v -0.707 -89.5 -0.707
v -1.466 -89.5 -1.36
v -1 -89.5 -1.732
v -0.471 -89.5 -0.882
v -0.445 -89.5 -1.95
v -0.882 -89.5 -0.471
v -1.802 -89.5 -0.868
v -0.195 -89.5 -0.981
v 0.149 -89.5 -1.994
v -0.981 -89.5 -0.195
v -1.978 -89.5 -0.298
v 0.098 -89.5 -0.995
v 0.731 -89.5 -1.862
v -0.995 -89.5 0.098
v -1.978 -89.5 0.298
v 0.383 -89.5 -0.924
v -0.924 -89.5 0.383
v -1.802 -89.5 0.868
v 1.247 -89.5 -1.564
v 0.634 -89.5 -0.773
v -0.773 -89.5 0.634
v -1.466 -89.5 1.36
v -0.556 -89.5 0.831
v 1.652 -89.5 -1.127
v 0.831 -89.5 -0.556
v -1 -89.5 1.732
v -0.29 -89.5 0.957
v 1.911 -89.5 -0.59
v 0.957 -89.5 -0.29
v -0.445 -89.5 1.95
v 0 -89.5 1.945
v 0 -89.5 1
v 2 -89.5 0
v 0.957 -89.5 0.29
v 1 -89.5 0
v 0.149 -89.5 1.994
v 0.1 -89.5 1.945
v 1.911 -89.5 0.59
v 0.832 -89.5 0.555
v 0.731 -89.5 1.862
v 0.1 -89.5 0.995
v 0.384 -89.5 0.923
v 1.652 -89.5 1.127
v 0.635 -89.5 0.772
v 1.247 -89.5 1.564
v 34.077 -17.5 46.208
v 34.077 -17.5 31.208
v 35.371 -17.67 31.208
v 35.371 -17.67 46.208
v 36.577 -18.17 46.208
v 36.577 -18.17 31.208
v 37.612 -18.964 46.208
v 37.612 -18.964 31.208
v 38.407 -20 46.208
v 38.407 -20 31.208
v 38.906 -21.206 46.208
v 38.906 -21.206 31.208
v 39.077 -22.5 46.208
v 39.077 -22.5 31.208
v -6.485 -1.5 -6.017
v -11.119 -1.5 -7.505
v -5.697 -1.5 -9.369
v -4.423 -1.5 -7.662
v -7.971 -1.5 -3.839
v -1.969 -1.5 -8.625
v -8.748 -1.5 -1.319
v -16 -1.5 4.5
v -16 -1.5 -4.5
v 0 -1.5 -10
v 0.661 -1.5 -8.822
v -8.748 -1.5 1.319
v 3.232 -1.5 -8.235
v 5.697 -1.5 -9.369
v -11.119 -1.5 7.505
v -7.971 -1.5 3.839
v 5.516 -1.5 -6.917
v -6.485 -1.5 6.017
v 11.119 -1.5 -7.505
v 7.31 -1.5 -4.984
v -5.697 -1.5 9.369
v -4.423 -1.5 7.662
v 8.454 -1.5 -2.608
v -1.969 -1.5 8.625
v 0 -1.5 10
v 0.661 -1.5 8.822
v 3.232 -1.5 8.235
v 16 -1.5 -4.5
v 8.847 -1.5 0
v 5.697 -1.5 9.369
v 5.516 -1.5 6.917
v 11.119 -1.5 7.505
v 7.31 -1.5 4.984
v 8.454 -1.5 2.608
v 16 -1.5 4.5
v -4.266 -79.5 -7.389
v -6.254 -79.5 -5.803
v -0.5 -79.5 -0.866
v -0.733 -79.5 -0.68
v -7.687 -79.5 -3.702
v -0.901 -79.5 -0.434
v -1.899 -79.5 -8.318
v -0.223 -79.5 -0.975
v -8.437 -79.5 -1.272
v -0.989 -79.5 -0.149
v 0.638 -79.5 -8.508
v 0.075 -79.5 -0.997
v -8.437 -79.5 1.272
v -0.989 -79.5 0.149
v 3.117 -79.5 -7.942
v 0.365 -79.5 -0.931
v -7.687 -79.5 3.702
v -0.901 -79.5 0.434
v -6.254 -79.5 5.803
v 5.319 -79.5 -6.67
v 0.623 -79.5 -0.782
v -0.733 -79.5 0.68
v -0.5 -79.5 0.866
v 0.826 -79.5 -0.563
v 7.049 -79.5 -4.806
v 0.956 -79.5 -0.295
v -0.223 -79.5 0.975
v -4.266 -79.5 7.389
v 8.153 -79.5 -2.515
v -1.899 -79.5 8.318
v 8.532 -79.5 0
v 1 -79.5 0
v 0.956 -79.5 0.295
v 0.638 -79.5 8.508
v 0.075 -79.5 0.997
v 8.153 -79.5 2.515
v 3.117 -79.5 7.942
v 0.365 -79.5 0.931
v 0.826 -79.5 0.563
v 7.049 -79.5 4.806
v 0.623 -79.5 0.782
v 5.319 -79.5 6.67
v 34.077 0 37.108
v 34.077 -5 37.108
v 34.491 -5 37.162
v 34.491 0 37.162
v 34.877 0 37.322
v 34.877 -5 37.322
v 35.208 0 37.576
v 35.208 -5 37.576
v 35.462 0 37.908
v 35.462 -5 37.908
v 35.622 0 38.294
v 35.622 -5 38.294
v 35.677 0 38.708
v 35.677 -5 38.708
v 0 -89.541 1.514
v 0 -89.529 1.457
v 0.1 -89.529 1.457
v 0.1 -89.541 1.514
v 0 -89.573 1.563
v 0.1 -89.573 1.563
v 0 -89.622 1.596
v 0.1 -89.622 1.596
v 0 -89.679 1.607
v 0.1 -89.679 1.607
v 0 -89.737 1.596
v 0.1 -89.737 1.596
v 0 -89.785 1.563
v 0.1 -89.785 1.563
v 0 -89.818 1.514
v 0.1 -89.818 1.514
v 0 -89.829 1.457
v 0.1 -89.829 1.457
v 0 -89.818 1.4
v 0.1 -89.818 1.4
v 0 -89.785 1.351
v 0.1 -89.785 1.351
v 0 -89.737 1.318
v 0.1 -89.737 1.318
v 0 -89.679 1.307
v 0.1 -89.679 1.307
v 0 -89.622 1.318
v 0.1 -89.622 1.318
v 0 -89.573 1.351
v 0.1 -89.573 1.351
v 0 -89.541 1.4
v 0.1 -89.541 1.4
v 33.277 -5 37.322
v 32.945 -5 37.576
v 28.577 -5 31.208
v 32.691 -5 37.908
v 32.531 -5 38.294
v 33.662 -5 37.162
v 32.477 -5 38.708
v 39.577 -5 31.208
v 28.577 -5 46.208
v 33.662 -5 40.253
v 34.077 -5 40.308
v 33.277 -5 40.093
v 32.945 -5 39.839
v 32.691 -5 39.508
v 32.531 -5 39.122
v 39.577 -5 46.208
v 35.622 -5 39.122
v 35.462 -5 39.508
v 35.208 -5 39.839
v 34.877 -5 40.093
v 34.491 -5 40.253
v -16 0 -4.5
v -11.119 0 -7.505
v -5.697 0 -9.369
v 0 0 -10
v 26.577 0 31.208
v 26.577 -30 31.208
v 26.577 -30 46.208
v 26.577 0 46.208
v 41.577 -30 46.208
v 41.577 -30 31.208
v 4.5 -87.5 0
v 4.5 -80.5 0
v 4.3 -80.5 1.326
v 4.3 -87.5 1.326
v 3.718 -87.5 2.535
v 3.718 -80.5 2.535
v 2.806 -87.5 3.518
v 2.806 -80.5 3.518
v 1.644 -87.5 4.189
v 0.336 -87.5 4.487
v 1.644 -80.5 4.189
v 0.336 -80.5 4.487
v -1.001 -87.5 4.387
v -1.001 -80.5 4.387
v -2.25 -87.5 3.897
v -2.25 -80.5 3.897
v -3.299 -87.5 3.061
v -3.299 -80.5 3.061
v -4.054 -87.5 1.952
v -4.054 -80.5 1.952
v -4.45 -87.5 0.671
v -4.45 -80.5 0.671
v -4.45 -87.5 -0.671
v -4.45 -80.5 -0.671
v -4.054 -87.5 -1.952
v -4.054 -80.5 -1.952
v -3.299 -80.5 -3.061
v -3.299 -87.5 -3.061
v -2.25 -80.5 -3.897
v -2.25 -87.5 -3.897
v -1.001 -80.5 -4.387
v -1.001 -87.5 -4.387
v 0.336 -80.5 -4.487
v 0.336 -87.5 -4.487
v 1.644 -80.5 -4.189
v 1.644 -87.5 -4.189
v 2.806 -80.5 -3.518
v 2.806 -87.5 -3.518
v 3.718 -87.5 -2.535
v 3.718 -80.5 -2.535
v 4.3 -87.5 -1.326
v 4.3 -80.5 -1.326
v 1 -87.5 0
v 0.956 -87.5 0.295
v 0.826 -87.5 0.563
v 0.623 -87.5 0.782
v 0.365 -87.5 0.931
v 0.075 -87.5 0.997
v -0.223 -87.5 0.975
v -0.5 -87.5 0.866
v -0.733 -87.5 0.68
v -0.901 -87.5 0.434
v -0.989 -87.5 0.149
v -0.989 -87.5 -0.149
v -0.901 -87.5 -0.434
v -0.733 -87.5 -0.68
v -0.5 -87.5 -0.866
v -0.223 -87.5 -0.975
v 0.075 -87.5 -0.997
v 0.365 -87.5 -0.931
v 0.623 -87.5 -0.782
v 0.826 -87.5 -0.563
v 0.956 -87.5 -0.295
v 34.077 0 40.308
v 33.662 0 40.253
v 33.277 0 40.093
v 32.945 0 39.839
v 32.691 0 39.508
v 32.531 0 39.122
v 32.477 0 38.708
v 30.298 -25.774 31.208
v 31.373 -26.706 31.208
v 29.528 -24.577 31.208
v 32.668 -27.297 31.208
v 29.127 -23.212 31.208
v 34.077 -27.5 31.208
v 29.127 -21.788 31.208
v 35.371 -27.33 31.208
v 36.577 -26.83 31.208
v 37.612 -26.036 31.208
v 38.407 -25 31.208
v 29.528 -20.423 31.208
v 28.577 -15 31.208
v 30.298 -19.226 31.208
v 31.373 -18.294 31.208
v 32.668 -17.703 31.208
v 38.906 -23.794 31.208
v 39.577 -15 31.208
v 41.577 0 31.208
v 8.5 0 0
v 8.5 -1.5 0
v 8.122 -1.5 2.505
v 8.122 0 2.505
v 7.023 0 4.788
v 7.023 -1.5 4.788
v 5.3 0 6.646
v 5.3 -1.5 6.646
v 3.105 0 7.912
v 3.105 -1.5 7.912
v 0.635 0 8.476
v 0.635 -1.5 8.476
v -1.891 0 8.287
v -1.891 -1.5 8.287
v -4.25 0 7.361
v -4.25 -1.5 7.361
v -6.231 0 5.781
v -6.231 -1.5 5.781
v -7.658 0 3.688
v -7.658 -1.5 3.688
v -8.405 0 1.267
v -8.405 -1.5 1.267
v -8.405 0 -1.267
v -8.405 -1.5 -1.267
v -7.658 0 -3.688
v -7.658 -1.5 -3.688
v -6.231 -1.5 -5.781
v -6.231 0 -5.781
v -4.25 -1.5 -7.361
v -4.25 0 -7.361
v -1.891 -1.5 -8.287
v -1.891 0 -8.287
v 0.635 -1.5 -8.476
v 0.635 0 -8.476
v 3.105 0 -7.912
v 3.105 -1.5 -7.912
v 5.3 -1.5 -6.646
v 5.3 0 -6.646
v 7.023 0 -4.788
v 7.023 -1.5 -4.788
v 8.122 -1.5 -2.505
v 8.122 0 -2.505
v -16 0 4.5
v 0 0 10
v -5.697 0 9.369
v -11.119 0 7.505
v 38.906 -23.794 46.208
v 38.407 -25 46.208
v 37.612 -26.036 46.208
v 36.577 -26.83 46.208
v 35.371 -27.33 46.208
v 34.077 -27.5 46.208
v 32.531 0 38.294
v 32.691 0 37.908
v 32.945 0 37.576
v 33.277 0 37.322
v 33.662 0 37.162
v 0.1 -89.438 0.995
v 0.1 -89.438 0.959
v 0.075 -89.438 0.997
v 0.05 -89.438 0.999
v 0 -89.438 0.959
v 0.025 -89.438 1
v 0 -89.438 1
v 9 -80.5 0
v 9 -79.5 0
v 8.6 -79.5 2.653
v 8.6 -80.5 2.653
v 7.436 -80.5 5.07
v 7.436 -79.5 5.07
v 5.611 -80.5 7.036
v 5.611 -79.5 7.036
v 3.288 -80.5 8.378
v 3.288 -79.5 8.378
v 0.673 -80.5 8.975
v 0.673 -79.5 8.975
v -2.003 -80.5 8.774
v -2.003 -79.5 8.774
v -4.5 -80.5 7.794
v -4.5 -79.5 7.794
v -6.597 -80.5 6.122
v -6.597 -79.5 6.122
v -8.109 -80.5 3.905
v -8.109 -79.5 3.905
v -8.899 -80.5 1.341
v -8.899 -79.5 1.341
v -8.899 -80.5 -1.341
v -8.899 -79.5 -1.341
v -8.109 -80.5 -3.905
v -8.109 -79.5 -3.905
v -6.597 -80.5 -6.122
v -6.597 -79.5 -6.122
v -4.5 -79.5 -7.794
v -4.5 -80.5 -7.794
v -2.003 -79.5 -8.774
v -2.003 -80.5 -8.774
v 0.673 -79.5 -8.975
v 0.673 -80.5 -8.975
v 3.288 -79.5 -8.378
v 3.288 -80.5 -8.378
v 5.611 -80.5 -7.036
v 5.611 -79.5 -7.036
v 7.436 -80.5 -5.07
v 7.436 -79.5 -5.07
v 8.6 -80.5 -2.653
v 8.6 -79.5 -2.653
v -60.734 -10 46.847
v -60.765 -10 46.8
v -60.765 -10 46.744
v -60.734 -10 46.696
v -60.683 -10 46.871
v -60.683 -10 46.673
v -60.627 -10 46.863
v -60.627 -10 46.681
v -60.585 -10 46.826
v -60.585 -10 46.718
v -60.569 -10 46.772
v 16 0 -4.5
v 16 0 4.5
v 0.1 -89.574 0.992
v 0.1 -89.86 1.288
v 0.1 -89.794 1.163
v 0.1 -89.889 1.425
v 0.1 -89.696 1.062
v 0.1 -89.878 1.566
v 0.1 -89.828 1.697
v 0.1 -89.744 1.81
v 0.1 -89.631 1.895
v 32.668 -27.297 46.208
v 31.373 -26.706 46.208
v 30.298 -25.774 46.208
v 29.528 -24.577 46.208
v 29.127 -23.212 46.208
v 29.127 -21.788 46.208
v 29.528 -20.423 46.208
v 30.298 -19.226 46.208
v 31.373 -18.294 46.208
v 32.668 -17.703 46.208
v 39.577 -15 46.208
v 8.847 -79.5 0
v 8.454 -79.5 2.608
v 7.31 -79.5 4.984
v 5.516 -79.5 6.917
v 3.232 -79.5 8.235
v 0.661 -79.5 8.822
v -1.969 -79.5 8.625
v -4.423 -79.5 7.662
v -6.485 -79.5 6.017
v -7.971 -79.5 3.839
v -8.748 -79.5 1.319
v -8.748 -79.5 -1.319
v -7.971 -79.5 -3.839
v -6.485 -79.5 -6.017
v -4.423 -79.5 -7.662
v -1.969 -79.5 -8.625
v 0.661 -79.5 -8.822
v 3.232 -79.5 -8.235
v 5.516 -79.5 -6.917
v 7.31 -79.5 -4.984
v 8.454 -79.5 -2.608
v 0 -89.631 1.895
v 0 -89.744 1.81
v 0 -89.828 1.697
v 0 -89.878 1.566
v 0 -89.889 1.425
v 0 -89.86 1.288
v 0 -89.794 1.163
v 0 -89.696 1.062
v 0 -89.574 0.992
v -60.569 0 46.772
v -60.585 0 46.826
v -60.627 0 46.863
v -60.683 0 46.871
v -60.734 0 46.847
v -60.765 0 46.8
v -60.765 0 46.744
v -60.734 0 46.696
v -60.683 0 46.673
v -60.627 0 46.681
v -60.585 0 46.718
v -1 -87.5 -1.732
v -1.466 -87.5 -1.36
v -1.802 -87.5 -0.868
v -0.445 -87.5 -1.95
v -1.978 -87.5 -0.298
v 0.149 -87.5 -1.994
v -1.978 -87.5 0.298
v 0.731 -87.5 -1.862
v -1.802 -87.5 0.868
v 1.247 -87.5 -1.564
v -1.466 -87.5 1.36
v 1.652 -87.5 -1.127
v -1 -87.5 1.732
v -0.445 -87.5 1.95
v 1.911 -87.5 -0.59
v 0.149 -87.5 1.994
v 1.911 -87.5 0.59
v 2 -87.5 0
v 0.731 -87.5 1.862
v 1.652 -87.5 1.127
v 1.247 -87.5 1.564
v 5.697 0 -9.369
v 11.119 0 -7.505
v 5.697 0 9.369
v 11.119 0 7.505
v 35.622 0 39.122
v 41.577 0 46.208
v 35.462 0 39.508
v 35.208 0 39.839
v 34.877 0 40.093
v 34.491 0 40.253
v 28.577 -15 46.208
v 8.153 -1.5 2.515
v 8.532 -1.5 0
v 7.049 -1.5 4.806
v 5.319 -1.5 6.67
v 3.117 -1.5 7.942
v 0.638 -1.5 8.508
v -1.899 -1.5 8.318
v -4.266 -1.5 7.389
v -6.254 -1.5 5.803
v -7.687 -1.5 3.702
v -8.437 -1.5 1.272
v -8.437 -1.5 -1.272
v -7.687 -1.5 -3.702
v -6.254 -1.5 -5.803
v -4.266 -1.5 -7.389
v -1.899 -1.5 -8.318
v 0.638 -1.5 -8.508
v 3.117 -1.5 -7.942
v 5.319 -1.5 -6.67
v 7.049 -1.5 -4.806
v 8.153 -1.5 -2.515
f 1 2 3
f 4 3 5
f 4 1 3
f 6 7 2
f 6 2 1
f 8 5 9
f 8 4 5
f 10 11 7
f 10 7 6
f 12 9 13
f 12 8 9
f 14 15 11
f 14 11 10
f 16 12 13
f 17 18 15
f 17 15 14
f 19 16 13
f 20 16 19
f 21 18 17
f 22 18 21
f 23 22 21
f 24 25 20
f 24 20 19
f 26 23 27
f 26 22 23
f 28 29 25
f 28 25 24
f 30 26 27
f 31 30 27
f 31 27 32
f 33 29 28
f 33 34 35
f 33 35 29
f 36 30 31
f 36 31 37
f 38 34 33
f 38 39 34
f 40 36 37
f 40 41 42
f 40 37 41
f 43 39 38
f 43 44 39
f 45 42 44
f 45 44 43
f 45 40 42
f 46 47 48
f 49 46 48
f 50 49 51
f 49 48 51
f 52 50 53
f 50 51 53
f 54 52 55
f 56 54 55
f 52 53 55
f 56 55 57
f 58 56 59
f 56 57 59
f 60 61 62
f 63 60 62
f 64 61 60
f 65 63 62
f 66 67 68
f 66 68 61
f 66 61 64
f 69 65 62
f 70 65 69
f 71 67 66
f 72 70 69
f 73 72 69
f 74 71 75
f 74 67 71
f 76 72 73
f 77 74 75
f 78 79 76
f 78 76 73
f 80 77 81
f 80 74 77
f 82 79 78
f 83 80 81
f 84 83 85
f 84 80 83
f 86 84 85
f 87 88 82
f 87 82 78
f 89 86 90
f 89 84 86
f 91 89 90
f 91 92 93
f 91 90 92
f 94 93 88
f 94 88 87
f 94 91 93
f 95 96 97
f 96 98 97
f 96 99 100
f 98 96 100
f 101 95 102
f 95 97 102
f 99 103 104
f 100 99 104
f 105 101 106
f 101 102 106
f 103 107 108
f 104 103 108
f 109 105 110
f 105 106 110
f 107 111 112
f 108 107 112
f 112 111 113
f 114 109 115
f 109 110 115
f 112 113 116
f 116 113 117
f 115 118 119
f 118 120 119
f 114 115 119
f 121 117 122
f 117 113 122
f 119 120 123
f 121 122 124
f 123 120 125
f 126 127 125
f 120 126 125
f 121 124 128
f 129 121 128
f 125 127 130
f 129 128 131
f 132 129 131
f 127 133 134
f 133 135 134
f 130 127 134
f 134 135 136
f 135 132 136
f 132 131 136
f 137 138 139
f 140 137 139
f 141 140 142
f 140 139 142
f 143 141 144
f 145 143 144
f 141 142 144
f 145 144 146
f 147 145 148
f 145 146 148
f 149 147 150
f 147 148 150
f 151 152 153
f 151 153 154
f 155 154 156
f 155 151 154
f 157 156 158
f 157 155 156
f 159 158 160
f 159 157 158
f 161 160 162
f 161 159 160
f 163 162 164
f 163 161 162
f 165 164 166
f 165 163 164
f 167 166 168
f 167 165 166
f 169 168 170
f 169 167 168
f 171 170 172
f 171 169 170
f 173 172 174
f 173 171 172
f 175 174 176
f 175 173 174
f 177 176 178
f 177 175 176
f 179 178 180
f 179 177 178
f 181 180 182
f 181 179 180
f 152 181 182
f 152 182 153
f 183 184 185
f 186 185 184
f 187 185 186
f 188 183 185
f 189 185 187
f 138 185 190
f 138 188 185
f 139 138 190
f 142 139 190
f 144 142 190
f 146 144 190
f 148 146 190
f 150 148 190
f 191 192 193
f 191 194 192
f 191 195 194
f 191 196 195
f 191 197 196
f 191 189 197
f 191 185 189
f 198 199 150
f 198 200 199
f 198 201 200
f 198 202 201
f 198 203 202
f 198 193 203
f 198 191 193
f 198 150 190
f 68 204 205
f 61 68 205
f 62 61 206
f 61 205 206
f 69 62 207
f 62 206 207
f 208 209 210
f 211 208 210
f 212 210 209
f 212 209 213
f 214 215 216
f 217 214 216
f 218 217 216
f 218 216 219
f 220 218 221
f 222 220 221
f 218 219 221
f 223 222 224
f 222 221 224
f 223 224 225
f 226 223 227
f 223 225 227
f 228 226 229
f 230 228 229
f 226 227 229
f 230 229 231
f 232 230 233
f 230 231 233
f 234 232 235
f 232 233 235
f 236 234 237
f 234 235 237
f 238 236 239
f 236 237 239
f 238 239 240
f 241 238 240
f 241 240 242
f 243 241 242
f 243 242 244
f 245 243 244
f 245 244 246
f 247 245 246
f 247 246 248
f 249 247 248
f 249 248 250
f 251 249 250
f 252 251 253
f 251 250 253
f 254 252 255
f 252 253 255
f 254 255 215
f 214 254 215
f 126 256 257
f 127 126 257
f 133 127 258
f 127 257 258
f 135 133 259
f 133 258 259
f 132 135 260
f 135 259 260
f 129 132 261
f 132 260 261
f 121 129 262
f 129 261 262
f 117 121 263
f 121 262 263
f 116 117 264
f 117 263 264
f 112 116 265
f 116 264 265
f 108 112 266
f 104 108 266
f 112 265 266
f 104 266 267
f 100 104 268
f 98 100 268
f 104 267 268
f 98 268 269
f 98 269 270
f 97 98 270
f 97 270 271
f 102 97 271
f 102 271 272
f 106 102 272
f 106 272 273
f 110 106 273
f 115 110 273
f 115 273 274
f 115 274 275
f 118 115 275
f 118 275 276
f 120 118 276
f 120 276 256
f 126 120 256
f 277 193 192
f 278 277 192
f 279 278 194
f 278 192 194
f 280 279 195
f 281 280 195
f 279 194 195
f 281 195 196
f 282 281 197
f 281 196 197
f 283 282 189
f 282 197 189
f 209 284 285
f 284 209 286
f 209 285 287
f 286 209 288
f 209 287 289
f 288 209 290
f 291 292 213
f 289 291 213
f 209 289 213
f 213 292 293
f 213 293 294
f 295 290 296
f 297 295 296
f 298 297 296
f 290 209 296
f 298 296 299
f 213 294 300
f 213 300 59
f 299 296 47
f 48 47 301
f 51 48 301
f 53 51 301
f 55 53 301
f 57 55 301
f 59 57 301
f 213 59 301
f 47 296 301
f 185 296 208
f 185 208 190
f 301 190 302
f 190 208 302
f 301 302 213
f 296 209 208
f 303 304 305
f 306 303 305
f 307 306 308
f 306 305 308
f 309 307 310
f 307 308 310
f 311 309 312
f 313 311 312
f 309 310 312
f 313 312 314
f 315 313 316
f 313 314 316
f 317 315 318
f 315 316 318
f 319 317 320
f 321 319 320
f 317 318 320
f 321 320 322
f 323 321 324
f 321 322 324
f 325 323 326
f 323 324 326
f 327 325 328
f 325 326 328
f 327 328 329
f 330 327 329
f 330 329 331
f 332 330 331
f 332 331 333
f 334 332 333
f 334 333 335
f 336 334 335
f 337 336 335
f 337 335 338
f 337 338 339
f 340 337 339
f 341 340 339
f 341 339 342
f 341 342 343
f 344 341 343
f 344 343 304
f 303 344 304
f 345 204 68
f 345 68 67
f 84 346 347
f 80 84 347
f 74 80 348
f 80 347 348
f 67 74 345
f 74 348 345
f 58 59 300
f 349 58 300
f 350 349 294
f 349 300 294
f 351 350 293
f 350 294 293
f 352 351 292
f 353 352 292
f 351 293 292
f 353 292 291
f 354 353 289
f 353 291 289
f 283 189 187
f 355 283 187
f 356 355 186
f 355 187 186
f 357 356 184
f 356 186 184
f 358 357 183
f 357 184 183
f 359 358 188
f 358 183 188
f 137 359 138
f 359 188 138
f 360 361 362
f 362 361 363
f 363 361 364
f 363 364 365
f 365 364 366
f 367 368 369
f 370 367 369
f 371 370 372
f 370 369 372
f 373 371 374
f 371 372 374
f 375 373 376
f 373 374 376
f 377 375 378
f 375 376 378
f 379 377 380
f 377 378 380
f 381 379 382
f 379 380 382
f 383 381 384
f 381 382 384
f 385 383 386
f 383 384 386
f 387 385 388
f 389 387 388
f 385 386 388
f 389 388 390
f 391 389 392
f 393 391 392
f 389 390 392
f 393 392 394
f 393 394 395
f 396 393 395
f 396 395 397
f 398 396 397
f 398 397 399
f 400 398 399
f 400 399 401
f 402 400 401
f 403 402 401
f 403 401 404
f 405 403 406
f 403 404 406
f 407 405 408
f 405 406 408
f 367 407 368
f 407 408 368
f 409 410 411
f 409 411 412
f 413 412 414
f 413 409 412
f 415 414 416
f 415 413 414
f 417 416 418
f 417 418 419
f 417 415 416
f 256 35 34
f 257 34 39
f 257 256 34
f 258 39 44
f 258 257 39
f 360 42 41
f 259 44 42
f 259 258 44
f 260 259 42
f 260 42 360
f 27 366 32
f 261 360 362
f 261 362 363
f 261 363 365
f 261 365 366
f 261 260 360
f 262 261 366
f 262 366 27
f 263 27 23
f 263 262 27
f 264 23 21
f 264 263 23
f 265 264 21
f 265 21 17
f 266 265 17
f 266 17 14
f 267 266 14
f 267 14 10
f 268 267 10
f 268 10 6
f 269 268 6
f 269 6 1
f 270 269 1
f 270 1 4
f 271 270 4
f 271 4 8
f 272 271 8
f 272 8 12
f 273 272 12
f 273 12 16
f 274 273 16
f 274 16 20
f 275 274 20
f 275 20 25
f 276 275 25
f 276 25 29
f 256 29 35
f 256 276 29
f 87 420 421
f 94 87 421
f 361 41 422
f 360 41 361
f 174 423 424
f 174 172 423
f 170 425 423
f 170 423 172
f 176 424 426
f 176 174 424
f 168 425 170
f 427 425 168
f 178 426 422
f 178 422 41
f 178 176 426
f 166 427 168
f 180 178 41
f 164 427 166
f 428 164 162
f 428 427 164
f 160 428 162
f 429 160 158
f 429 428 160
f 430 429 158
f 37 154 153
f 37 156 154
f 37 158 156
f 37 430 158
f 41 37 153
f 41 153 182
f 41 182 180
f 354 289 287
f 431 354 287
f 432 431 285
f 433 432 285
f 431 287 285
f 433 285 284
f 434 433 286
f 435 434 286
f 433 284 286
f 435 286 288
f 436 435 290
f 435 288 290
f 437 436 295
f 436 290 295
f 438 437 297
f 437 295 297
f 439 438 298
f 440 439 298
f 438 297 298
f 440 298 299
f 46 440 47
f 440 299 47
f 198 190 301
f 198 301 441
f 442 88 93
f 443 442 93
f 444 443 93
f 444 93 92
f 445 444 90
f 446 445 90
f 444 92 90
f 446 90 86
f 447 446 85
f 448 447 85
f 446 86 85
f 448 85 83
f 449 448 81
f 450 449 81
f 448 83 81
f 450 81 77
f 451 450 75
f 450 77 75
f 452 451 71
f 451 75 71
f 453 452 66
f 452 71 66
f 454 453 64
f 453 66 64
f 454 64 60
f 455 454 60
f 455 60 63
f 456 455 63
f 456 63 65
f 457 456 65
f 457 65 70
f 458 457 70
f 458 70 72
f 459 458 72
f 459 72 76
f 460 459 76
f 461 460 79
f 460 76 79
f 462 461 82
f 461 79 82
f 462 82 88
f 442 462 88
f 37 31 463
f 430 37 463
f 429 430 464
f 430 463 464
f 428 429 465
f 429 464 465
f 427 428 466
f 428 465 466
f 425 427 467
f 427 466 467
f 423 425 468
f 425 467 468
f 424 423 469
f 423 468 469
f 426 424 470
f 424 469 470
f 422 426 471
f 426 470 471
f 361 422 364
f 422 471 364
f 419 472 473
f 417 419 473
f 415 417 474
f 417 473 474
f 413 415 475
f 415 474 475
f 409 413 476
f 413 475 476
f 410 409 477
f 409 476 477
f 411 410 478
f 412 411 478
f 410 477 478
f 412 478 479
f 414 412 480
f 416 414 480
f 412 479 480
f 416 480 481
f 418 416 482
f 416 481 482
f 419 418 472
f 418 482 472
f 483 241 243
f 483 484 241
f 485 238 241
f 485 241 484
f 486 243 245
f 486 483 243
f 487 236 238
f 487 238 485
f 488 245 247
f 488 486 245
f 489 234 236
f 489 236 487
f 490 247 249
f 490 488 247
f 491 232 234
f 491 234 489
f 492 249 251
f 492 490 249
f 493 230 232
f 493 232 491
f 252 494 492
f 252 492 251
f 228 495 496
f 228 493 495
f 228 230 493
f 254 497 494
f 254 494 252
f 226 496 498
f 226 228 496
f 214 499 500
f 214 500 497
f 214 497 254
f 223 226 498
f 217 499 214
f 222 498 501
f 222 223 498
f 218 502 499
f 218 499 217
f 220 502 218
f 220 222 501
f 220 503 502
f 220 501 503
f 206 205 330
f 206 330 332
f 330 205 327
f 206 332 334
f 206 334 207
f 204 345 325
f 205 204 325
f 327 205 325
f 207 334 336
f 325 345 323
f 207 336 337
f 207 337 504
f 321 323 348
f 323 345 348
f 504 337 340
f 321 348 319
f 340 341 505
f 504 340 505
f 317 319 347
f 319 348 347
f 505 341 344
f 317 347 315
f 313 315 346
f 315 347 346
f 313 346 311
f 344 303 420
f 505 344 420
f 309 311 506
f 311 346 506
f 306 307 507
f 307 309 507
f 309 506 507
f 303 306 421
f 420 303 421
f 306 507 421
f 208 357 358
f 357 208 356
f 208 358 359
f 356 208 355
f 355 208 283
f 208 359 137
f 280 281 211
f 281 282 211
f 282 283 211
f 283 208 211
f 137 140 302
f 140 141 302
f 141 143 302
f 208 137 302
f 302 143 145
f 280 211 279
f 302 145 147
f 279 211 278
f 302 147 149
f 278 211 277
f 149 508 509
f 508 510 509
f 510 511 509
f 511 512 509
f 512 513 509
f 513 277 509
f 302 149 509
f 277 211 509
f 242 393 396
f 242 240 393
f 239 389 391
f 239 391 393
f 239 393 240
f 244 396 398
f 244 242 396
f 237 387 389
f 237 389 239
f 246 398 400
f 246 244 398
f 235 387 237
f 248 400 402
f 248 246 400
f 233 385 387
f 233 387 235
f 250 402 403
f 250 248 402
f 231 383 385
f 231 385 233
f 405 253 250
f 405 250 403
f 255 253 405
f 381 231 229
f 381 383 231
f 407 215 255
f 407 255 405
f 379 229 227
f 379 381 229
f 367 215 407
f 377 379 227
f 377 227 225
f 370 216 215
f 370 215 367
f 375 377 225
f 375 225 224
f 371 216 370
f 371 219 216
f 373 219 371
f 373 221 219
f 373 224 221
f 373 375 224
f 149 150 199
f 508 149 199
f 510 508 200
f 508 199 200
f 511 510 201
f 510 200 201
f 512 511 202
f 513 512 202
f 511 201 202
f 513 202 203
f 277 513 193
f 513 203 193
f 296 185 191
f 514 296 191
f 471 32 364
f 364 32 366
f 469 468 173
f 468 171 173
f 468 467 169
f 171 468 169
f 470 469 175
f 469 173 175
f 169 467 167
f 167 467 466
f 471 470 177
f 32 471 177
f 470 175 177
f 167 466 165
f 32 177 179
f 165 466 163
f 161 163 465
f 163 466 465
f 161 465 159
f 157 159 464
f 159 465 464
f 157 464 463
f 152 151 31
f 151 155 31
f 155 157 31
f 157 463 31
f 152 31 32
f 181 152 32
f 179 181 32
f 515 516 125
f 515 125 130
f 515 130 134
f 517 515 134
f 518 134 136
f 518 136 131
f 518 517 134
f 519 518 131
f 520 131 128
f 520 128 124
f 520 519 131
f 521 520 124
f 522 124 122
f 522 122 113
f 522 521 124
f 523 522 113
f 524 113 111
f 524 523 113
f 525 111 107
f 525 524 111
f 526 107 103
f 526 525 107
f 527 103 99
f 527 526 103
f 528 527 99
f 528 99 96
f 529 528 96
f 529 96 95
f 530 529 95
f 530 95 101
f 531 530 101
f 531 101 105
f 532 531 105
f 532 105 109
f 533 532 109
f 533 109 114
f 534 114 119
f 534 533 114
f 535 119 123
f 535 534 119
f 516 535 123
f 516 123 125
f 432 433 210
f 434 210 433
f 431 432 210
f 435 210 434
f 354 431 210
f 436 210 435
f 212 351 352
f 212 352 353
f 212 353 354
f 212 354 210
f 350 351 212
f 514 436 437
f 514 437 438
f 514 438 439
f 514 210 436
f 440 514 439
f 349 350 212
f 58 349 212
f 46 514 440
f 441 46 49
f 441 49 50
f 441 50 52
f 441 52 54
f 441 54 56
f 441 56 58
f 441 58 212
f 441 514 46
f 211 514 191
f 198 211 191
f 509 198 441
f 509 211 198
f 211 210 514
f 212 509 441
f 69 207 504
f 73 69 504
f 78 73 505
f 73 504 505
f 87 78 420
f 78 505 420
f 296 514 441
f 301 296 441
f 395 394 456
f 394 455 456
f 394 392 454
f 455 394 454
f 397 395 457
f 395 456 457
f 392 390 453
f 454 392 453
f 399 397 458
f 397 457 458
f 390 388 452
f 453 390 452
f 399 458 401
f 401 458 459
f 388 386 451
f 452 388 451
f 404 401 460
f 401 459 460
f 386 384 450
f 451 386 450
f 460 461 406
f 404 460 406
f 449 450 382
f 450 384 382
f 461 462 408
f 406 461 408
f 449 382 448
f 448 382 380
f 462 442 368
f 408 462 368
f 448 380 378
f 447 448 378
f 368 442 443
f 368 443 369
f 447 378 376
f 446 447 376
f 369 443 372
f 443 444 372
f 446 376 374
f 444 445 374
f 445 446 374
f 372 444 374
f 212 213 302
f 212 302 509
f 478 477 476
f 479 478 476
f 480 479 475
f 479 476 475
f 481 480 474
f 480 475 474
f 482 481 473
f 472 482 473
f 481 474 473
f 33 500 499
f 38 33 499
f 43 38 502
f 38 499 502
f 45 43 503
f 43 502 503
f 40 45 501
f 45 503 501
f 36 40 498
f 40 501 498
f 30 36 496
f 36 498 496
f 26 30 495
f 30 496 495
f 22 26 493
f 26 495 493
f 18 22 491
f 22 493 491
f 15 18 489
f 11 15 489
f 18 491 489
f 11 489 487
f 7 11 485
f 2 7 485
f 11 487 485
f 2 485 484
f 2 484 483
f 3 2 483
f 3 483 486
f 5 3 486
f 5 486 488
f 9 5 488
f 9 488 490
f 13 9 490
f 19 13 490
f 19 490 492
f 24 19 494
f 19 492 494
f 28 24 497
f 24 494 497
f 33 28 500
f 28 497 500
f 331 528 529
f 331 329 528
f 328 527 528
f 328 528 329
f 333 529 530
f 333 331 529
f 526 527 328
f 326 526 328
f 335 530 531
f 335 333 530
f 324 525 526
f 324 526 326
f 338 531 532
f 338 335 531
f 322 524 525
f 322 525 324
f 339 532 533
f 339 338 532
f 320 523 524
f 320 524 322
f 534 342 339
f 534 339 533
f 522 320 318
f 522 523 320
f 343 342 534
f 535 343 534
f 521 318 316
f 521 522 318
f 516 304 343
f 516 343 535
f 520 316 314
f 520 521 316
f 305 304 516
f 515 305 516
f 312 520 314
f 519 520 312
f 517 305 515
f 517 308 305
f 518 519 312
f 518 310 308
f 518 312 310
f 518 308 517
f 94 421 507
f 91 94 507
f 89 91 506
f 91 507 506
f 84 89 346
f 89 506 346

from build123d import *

# Parameters (mm, degrees)
F0_W      = 16
F0_H      = 9
F1_DEPTH  = 1.5
F2_R      = 8.5
F3_DEPTH  = 1.501
F4_R      = 8.846955
F4_R_2    = 8.531815
F5_DEPTH  = 78
F6_R      = 9
F7_DEPTH  = 1
F8_R      = 4.5
F9_DEPTH  = 7
F10_R     = 2
F10_R_2   = 1
F11_DEPTH = 2
F12_R     = 1
F13_DEPTH = 87.501
F14_R     = 0.15
F15_DEPTH = 0.1
F16_R     = 0.1
F17_DEPTH = 10
F18_W     = 15
F18_H     = 15
F19_DEPTH = 5
F21_DEPTH = 5.001
F22_W     = 2
F22_H     = 15
F23_DEPTH = 10
F24_W     = 15
F24_H     = 15
F25_DEPTH = 15
F27_DEPTH = 15.665169


with BuildPart() as f1:
    # F0 (on Front) → F1 (new body)
    with BuildSketch(Plane.XZ):
        with BuildLine():
            ThreePointArc((0, -10), (8.459462, -8.586617), (16, -4.5))
            Line((16, -4.5), (0, -4.5))
            Line((0, -4.5), (0, -10))
        make_face()
        with Locations((8, 0)):
            Rectangle(F0_W, F0_H)
        with BuildLine():
            Line((0, -10), (0, -4.5))
            Line((0, -4.5), (-16, -4.5))
            ThreePointArc((-16, -4.5), (-8.459462, -8.586617), (0, -10))
        make_face()
        with Locations((-8, 0)):
            Rectangle(F0_W, F0_H)
        with BuildLine():
            Line((0, 4.5), (16, 4.5))
            ThreePointArc((16, 4.5), (8.459462, 8.586617), (0, 10))
            Line((0, 10), (0, 4.5))
        make_face()
        with BuildLine():
            Line((-16, 4.5), (0, 4.5))
            Line((0, 4.5), (0, 10))
            ThreePointArc((0, 10), (-8.459462, 8.586617), (-16, 4.5))
        make_face()
    extrude(amount=F1_DEPTH)

    # F2 (on face) → F3 (cut, through all)
    with BuildSketch(Plane.XZ.offset(1.5)):
        Circle(F2_R)
    extrude(amount=-F3_DEPTH, mode=Mode.SUBTRACT)

    # F4 (on face) → F5 (join)
    with BuildSketch(Plane.XZ.offset(1.5)):
        Circle(F4_R)
        Circle(F4_R_2, mode=Mode.SUBTRACT)
    extrude(amount=F5_DEPTH)

    # F6 (on face) → F7 (join)
    with BuildSketch(Plane.XZ.offset(79.5)):
        Circle(F6_R)
    extrude(amount=F7_DEPTH)

    # F8 (on face) → F9 (join)
    with BuildSketch(Plane.XZ.offset(80.5)):
        Circle(F8_R)
    extrude(amount=F9_DEPTH)

    # F10 (on face) → F11 (join)
    with BuildSketch(Plane.XZ.offset(87.5)):
        Circle(F10_R)
        Circle(F10_R_2, mode=Mode.SUBTRACT)
    extrude(amount=F11_DEPTH)

    # F12 (on face) → F13 (cut, through all)
    with BuildSketch(Plane.XZ.offset(87.5)):
        Circle(F12_R)
    extrude(amount=-F13_DEPTH, mode=Mode.SUBTRACT)

    # F14 (on Right) → F15 (join)
    with BuildSketch(Plane.YZ):
        with BuildLine():
            Line((-89.437596, 0.959231), (-89.454034, 1.952762))
            ThreePointArc((-89.454034, 1.952762), (-89.889573, 1.448655), (-89.437596, 0.959231))
        make_face()
        with Locations((-89.679241, 1.456926)):
            Circle(F14_R, mode=Mode.SUBTRACT)
    extrude(amount=F15_DEPTH)


with BuildPart() as f17:
    # F16 (on Front) → F17 (new body)
    with BuildSketch(Plane.XZ):
        with Locations((-60.668886, 46.771824)):
            Circle(F16_R)
    extrude(amount=F17_DEPTH)


with BuildPart() as f19:
    # F18 (on Front) → F19 (new body)
    with BuildSketch(Plane.XZ):
        with Locations((34.076576, 38.707655)):
            Rectangle(F18_W, F18_H)
    extrude(amount=F19_DEPTH)

    # F20 (on face) → F21 (cut, through all)
    with BuildSketch(Plane.XZ.offset(5)):
        with BuildLine():
            ThreePointArc((35.676576, 38.707655), (35.207947, 39.839026), (34.076576, 40.307655))
            Line((34.076576, 40.307655), (34.076576, 38.707655))
            Line((34.076576, 38.707655), (35.676576, 38.707655))
        make_face()
        with BuildLine():
            Line((34.076576, 38.707655), (34.076576, 40.307655))
            ThreePointArc((34.076576, 40.307655), (32.945205, 39.839026), (32.476576, 38.707655))
            Line((32.476576, 38.707655), (34.076576, 38.707655))
        make_face()
        with BuildLine():
            Line((35.676576, 38.707655), (34.076576, 38.707655))
            Line((34.076576, 38.707655), (34.076576, 37.107655))
            ThreePointArc((34.076576, 37.107655), (35.207947, 37.576284), (35.676576, 38.707655))
        make_face()
        with BuildLine():
            Line((34.076576, 37.107655), (34.076576, 38.707655))
            Line((34.076576, 38.707655), (32.476576, 38.707655))
            ThreePointArc((32.476576, 38.707655), (32.945205, 37.576284), (34.076576, 37.107655))
        make_face()
    extrude(amount=-F21_DEPTH, mode=Mode.SUBTRACT)

    # F22 (on face) → F23 (join)
    with BuildSketch(Plane.XZ.offset(5)):
        with Locations((27.576576, 38.707655)):
            Rectangle(F22_W, F22_H)
        with Locations((40.576576, 38.707655)):
            Rectangle(F22_W, F22_H)
    extrude(amount=F23_DEPTH)

    # F24 (on face) → F25 (join)
    with BuildSketch(Plane.XZ.offset(15)):
        with Locations((34.076576, 38.707655)):
            Rectangle(F24_W, F24_H)
    extrude(amount=F25_DEPTH)

    # F26 (on face) → F27 (cut, through all)
    with BuildSketch(Plane(origin=(0, 0, 31.207655), x_dir=(1, 0, 0), z_dir=(0, 0, -1))):
        with BuildLine():
            ThreePointArc((34.076576, 27.5), (29.076576, 22.5), (34.076576, 17.5))
            Line((34.076576, 17.5), (34.076576, 27.5))
        make_face()
        with BuildLine():
            Line((34.076576, 27.5), (34.076576, 17.5))
            ThreePointArc((34.076576, 17.5), (37.61211, 18.964466), (39.076576, 22.5))
            ThreePointArc((39.076576, 22.5), (37.61211, 26.035534), (34.076576, 27.5))
        make_face()
    extrude(amount=-F27_DEPTH, mode=Mode.SUBTRACT)


solid = Compound([f1.part, f17.part, f19.part])
